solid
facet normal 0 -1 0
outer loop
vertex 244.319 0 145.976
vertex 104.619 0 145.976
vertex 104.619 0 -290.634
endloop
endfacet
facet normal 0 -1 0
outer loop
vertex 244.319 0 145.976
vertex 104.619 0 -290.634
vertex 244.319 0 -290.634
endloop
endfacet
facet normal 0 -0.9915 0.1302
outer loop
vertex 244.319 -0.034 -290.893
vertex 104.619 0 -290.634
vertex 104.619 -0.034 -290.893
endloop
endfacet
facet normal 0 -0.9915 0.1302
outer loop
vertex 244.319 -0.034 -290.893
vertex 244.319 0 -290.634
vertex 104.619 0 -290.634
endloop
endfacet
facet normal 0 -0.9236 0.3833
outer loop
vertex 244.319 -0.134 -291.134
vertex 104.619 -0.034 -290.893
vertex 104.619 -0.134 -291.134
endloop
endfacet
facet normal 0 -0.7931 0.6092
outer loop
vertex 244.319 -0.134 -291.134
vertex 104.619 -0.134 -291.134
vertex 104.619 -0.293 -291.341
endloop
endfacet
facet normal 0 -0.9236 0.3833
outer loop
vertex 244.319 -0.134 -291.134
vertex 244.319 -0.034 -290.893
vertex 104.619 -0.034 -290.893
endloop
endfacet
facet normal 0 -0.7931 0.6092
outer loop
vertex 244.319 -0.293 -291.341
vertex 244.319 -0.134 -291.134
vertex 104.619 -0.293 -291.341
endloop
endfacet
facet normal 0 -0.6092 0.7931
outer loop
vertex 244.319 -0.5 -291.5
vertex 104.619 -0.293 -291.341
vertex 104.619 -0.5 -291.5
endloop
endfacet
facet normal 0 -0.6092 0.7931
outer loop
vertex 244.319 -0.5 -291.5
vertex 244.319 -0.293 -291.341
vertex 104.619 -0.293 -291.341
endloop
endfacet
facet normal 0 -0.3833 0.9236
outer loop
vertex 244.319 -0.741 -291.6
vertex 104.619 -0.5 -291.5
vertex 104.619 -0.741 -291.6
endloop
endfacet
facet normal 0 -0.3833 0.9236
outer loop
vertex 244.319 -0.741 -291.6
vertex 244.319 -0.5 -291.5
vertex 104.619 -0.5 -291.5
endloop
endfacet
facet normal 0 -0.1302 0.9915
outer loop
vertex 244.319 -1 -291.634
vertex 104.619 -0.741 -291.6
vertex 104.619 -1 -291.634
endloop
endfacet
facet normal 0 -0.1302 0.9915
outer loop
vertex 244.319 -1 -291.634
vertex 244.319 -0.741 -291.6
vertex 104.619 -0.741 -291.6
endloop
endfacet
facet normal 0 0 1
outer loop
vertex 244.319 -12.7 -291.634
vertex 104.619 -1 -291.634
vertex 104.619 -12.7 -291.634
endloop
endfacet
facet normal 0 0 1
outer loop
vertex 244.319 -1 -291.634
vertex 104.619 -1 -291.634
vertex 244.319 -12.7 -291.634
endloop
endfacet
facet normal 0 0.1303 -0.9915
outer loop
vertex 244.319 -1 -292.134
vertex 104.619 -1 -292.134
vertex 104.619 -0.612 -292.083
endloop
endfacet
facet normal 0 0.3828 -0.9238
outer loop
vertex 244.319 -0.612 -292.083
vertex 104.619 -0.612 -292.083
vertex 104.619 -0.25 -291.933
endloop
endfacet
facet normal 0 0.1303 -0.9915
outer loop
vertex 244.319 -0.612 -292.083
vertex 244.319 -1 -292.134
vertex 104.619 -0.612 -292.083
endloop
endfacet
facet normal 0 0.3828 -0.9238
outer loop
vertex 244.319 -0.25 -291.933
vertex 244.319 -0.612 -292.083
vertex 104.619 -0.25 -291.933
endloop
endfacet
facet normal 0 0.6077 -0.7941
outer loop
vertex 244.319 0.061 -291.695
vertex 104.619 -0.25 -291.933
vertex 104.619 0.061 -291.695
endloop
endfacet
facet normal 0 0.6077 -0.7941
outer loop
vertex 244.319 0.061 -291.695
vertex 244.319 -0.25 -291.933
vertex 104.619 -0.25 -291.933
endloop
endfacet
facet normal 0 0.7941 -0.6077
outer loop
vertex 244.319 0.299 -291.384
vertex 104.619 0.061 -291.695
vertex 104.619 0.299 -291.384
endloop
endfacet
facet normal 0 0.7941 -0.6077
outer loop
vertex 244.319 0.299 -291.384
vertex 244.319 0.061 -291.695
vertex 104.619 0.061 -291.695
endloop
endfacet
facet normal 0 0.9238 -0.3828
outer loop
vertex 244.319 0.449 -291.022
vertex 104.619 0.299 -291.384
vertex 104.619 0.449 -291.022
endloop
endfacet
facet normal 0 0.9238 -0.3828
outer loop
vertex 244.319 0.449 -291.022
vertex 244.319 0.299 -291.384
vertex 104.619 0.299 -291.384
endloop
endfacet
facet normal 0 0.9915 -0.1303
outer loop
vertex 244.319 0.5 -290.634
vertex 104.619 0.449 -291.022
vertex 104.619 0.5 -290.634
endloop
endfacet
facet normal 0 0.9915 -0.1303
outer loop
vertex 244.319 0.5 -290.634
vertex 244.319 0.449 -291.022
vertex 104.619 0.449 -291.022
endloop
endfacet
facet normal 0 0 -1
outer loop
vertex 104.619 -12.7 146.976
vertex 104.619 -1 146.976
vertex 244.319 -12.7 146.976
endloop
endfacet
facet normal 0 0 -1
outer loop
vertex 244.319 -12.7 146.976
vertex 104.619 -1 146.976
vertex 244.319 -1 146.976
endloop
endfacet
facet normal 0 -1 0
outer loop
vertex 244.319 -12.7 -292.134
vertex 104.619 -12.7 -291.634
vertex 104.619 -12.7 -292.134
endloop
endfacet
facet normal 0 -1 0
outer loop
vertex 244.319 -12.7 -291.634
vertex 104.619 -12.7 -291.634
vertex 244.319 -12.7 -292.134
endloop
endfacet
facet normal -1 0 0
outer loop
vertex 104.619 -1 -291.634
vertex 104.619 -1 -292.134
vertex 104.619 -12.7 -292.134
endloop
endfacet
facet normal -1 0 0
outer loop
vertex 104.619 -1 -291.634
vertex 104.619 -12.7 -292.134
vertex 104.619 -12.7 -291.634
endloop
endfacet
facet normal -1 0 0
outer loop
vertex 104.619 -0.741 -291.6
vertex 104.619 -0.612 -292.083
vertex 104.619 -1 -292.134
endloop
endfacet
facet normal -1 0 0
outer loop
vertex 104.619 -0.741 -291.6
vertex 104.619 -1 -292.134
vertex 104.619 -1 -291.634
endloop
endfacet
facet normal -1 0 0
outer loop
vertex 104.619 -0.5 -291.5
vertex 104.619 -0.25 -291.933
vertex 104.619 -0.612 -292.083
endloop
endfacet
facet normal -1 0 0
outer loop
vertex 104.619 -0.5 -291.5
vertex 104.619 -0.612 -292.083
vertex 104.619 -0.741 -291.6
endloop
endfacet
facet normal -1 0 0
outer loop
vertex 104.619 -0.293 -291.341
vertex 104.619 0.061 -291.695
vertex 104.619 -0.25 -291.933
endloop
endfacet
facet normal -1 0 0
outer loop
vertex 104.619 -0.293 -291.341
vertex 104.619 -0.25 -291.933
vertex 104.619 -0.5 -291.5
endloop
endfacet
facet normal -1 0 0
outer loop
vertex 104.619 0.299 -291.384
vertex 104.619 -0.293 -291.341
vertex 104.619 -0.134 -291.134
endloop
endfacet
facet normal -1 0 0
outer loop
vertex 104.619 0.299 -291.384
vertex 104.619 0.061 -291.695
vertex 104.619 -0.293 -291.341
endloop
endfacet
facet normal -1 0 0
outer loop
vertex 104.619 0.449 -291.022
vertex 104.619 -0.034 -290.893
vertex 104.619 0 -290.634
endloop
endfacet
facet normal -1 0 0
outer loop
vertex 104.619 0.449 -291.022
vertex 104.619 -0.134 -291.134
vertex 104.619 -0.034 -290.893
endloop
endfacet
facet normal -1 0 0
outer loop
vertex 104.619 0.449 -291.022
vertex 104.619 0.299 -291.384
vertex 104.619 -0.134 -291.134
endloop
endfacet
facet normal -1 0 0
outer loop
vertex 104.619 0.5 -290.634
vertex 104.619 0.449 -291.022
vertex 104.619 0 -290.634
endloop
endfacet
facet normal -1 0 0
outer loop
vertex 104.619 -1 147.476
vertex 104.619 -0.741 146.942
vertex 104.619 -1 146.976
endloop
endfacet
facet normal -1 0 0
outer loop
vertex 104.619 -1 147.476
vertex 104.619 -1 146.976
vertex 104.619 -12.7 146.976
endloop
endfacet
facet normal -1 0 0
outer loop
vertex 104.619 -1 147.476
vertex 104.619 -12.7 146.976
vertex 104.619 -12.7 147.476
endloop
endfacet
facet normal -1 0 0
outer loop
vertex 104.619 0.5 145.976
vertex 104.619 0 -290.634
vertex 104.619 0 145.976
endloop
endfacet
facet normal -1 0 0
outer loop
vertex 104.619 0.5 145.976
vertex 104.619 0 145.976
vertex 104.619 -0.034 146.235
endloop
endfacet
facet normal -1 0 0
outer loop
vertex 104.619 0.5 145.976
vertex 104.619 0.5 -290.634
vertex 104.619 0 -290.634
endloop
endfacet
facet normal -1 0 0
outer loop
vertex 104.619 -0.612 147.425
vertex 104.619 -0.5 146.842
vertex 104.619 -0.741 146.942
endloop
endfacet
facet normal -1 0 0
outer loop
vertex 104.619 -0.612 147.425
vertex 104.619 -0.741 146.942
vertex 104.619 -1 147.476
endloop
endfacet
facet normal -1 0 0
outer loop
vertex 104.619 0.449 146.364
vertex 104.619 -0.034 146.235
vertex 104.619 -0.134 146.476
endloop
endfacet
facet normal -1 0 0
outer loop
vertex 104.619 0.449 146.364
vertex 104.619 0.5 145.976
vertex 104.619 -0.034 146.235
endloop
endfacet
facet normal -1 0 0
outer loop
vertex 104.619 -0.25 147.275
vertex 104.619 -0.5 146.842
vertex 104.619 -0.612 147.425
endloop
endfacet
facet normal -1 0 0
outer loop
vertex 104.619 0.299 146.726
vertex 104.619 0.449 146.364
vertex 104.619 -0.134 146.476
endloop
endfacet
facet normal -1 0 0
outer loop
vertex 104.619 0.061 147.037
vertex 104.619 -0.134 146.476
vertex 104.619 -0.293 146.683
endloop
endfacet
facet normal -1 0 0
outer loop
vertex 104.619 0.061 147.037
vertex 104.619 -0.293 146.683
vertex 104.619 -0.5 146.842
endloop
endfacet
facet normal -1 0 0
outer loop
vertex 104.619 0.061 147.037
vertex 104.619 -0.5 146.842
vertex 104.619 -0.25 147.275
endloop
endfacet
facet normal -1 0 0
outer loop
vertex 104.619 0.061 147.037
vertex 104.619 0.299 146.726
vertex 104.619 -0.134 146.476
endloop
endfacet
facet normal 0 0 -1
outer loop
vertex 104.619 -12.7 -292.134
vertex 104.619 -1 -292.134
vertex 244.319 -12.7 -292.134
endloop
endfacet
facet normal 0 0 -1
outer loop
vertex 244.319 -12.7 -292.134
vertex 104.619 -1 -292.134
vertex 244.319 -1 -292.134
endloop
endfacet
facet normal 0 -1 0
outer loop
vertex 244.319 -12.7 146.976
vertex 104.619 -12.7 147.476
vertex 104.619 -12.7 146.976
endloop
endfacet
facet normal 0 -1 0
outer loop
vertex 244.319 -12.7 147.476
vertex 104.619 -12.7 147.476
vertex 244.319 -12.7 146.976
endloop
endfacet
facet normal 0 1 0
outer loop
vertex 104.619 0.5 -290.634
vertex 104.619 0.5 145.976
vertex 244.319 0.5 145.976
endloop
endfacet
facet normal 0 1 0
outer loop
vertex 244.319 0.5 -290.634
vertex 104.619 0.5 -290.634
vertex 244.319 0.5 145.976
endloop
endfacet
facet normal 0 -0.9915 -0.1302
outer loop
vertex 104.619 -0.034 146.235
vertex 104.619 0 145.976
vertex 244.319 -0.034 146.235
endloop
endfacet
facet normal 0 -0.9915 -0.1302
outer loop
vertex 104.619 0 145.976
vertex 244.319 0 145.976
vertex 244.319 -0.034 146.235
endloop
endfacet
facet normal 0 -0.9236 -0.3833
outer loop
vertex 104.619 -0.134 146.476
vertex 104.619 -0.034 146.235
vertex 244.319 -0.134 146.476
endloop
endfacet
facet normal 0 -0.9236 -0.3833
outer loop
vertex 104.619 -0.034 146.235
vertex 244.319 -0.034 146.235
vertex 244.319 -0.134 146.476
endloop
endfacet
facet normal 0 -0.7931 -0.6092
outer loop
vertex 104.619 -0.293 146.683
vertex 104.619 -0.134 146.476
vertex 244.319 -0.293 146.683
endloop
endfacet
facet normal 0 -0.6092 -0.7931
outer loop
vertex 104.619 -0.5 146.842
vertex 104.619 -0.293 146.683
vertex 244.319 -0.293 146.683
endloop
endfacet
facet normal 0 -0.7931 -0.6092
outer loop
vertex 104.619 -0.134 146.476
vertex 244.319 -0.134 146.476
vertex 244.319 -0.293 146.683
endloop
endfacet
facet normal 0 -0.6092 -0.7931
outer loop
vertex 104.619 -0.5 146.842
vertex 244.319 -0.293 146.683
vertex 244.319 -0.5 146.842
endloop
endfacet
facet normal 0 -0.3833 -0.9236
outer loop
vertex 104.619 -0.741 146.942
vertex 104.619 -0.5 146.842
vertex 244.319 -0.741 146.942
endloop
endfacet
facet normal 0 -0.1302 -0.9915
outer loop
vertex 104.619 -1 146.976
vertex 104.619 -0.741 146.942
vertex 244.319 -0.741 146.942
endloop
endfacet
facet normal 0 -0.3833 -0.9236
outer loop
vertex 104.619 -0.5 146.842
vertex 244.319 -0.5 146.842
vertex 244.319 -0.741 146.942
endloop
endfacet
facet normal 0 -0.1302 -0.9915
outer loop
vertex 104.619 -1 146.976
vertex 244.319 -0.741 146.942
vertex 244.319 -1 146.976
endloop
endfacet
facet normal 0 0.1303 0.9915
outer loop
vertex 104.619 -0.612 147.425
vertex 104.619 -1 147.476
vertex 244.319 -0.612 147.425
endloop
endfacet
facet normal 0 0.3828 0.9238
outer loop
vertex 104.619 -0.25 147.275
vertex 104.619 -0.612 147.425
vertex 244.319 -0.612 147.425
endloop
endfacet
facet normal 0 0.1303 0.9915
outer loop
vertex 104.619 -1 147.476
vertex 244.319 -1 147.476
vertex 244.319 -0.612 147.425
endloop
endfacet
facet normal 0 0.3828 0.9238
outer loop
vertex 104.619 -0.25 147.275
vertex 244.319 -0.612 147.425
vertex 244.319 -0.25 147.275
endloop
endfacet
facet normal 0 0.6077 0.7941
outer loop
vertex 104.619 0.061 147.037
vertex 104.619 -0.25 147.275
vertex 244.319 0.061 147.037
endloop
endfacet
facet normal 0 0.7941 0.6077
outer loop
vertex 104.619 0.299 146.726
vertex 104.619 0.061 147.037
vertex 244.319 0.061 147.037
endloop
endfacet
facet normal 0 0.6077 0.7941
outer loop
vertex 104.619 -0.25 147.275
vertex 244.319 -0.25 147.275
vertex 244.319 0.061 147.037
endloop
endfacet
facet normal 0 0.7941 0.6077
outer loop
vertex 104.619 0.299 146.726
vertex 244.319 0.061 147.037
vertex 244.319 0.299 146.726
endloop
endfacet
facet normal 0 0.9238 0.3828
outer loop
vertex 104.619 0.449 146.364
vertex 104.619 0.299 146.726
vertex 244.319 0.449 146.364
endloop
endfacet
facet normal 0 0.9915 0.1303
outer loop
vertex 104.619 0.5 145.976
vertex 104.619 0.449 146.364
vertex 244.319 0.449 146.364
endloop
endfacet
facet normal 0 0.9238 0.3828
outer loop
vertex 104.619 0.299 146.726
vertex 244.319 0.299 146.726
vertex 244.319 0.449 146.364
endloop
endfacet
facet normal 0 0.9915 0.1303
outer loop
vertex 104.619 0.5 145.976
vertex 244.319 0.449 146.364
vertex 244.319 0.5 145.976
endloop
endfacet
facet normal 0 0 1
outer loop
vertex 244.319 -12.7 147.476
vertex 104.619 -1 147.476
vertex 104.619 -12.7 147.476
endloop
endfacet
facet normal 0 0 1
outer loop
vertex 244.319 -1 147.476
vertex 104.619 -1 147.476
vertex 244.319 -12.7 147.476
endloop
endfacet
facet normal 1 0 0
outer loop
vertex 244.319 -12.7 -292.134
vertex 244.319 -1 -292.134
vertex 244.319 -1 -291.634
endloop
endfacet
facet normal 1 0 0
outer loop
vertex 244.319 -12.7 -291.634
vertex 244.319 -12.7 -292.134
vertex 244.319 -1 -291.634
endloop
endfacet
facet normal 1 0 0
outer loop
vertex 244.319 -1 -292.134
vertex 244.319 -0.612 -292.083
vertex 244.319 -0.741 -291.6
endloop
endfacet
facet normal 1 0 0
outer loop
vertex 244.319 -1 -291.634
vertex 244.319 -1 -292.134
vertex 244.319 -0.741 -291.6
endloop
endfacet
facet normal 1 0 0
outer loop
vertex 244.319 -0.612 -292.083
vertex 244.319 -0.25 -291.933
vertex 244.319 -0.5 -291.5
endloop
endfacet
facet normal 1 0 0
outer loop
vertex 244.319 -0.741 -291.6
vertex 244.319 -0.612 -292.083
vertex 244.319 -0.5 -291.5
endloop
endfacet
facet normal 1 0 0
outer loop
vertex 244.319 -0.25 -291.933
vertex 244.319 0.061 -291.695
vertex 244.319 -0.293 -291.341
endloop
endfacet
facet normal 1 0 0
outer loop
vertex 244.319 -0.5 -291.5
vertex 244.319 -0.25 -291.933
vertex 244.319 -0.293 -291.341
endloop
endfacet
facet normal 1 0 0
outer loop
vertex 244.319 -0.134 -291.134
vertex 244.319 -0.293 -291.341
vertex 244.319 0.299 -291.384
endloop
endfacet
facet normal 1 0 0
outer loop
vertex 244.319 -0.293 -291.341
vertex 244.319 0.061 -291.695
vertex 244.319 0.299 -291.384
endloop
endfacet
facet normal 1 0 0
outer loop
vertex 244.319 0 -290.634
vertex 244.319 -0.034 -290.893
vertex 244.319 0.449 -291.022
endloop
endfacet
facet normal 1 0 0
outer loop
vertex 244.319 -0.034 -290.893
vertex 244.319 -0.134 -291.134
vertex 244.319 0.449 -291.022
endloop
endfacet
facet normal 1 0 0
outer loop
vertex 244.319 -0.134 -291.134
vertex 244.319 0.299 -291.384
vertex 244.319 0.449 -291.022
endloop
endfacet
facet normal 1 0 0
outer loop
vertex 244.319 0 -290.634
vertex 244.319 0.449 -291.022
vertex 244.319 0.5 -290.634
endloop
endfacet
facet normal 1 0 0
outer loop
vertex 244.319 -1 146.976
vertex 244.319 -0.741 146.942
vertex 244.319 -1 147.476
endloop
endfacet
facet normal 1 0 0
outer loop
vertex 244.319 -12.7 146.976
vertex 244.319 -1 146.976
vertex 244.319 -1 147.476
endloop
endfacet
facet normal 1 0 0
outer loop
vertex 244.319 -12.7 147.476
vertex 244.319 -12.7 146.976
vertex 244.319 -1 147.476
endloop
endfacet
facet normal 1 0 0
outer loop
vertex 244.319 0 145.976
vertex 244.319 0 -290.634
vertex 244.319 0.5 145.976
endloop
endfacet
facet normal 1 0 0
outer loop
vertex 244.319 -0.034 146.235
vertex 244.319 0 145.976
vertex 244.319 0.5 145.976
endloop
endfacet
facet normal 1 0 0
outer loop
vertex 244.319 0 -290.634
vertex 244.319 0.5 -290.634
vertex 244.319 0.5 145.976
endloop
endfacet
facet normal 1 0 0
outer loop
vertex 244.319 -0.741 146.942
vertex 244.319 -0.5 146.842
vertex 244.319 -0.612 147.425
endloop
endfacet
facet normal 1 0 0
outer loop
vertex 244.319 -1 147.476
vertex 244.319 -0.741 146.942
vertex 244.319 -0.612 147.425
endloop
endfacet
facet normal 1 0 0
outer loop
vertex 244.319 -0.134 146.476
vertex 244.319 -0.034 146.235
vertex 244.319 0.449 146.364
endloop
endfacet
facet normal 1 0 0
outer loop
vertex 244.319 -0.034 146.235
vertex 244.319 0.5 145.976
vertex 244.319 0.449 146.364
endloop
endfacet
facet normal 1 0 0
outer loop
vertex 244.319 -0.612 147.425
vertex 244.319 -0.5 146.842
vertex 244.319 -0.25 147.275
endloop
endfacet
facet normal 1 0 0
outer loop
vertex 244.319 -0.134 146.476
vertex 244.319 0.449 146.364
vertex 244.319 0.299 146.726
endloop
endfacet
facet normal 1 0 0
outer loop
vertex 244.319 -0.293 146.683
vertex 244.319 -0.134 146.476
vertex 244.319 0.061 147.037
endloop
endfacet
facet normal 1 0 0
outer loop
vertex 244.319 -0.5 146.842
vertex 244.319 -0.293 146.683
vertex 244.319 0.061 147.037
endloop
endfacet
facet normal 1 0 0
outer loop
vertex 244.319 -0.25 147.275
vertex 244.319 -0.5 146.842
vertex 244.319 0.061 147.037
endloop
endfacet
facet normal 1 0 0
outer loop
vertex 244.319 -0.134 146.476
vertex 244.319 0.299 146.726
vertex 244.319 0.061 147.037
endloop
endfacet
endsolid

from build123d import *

# Parameters (mm, degrees)
SKETCH1_W           = 139.7
SKETCH1_H           = 439.61
BOSS_EXTRUDE1_DEPTH = 0.5
SKETCH2_W           = 139.7
SKETCH2_H           = 0.5
BOSS_EXTRUDE2_DEPTH = 12.7
FILLET1_R           = 1
FILLET2_R           = 1.5
SKETCH4_W           = 139.7
SKETCH4_H           = 0.5
BOSS_EXTRUDE3_DEPTH = 12.7
FILLET3_R           = 1
FILLET4_R           = 1.5


with BuildPart() as part:
    # Sketch1 → Boss-Extrude1 (new body)
    with BuildSketch(Plane(origin=(0, 0, 0), x_dir=(1, 0, 0), z_dir=(0, 1, 0))):
        with Locations((174.46911026, 72.328904153)):
            Rectangle(SKETCH1_W, SKETCH1_H)
    extrude(amount=BOSS_EXTRUDE1_DEPTH)

    # Sketch2 → Boss-Extrude2 (add)
    with BuildSketch(Plane.XZ):
        with Locations((174.46911026, 147.226095847)):
            Rectangle(SKETCH2_W, SKETCH2_H)
    extrude(amount=BOSS_EXTRUDE2_DEPTH)

    # Fillet1
    fillet1_edges = [part.edges().sort_by_distance(p)[0] for p in [
        (174.46911026, 0, 146.976095847),
    ]]
    fillet(fillet1_edges, radius=FILLET1_R)

    # Fillet2
    fillet2_edges = [part.edges().sort_by_distance(p)[0] for p in [
        (174.46911026, 0.5, 147.476095847),
    ]]
    fillet(fillet2_edges, radius=FILLET2_R)

    # Sketch4 → Boss-Extrude3 (add)
    with BuildSketch(Plane.XZ):
        with Locations((174.46911026, -291.883904153)):
            Rectangle(SKETCH4_W, SKETCH4_H)
    extrude(amount=BOSS_EXTRUDE3_DEPTH)

    # Fillet3
    fillet3_edges = [part.edges().sort_by_distance(p)[0] for p in [
        (174.46911026, 0, -291.633904153),
    ]]
    fillet(fillet3_edges, radius=FILLET3_R)

    # Fillet4
    fillet4_edges = [part.edges().sort_by_distance(p)[0] for p in [
        (174.46911026, 0.5, -292.133904153),
    ]]
    fillet(fillet4_edges, radius=FILLET4_R)


solid = part.part
